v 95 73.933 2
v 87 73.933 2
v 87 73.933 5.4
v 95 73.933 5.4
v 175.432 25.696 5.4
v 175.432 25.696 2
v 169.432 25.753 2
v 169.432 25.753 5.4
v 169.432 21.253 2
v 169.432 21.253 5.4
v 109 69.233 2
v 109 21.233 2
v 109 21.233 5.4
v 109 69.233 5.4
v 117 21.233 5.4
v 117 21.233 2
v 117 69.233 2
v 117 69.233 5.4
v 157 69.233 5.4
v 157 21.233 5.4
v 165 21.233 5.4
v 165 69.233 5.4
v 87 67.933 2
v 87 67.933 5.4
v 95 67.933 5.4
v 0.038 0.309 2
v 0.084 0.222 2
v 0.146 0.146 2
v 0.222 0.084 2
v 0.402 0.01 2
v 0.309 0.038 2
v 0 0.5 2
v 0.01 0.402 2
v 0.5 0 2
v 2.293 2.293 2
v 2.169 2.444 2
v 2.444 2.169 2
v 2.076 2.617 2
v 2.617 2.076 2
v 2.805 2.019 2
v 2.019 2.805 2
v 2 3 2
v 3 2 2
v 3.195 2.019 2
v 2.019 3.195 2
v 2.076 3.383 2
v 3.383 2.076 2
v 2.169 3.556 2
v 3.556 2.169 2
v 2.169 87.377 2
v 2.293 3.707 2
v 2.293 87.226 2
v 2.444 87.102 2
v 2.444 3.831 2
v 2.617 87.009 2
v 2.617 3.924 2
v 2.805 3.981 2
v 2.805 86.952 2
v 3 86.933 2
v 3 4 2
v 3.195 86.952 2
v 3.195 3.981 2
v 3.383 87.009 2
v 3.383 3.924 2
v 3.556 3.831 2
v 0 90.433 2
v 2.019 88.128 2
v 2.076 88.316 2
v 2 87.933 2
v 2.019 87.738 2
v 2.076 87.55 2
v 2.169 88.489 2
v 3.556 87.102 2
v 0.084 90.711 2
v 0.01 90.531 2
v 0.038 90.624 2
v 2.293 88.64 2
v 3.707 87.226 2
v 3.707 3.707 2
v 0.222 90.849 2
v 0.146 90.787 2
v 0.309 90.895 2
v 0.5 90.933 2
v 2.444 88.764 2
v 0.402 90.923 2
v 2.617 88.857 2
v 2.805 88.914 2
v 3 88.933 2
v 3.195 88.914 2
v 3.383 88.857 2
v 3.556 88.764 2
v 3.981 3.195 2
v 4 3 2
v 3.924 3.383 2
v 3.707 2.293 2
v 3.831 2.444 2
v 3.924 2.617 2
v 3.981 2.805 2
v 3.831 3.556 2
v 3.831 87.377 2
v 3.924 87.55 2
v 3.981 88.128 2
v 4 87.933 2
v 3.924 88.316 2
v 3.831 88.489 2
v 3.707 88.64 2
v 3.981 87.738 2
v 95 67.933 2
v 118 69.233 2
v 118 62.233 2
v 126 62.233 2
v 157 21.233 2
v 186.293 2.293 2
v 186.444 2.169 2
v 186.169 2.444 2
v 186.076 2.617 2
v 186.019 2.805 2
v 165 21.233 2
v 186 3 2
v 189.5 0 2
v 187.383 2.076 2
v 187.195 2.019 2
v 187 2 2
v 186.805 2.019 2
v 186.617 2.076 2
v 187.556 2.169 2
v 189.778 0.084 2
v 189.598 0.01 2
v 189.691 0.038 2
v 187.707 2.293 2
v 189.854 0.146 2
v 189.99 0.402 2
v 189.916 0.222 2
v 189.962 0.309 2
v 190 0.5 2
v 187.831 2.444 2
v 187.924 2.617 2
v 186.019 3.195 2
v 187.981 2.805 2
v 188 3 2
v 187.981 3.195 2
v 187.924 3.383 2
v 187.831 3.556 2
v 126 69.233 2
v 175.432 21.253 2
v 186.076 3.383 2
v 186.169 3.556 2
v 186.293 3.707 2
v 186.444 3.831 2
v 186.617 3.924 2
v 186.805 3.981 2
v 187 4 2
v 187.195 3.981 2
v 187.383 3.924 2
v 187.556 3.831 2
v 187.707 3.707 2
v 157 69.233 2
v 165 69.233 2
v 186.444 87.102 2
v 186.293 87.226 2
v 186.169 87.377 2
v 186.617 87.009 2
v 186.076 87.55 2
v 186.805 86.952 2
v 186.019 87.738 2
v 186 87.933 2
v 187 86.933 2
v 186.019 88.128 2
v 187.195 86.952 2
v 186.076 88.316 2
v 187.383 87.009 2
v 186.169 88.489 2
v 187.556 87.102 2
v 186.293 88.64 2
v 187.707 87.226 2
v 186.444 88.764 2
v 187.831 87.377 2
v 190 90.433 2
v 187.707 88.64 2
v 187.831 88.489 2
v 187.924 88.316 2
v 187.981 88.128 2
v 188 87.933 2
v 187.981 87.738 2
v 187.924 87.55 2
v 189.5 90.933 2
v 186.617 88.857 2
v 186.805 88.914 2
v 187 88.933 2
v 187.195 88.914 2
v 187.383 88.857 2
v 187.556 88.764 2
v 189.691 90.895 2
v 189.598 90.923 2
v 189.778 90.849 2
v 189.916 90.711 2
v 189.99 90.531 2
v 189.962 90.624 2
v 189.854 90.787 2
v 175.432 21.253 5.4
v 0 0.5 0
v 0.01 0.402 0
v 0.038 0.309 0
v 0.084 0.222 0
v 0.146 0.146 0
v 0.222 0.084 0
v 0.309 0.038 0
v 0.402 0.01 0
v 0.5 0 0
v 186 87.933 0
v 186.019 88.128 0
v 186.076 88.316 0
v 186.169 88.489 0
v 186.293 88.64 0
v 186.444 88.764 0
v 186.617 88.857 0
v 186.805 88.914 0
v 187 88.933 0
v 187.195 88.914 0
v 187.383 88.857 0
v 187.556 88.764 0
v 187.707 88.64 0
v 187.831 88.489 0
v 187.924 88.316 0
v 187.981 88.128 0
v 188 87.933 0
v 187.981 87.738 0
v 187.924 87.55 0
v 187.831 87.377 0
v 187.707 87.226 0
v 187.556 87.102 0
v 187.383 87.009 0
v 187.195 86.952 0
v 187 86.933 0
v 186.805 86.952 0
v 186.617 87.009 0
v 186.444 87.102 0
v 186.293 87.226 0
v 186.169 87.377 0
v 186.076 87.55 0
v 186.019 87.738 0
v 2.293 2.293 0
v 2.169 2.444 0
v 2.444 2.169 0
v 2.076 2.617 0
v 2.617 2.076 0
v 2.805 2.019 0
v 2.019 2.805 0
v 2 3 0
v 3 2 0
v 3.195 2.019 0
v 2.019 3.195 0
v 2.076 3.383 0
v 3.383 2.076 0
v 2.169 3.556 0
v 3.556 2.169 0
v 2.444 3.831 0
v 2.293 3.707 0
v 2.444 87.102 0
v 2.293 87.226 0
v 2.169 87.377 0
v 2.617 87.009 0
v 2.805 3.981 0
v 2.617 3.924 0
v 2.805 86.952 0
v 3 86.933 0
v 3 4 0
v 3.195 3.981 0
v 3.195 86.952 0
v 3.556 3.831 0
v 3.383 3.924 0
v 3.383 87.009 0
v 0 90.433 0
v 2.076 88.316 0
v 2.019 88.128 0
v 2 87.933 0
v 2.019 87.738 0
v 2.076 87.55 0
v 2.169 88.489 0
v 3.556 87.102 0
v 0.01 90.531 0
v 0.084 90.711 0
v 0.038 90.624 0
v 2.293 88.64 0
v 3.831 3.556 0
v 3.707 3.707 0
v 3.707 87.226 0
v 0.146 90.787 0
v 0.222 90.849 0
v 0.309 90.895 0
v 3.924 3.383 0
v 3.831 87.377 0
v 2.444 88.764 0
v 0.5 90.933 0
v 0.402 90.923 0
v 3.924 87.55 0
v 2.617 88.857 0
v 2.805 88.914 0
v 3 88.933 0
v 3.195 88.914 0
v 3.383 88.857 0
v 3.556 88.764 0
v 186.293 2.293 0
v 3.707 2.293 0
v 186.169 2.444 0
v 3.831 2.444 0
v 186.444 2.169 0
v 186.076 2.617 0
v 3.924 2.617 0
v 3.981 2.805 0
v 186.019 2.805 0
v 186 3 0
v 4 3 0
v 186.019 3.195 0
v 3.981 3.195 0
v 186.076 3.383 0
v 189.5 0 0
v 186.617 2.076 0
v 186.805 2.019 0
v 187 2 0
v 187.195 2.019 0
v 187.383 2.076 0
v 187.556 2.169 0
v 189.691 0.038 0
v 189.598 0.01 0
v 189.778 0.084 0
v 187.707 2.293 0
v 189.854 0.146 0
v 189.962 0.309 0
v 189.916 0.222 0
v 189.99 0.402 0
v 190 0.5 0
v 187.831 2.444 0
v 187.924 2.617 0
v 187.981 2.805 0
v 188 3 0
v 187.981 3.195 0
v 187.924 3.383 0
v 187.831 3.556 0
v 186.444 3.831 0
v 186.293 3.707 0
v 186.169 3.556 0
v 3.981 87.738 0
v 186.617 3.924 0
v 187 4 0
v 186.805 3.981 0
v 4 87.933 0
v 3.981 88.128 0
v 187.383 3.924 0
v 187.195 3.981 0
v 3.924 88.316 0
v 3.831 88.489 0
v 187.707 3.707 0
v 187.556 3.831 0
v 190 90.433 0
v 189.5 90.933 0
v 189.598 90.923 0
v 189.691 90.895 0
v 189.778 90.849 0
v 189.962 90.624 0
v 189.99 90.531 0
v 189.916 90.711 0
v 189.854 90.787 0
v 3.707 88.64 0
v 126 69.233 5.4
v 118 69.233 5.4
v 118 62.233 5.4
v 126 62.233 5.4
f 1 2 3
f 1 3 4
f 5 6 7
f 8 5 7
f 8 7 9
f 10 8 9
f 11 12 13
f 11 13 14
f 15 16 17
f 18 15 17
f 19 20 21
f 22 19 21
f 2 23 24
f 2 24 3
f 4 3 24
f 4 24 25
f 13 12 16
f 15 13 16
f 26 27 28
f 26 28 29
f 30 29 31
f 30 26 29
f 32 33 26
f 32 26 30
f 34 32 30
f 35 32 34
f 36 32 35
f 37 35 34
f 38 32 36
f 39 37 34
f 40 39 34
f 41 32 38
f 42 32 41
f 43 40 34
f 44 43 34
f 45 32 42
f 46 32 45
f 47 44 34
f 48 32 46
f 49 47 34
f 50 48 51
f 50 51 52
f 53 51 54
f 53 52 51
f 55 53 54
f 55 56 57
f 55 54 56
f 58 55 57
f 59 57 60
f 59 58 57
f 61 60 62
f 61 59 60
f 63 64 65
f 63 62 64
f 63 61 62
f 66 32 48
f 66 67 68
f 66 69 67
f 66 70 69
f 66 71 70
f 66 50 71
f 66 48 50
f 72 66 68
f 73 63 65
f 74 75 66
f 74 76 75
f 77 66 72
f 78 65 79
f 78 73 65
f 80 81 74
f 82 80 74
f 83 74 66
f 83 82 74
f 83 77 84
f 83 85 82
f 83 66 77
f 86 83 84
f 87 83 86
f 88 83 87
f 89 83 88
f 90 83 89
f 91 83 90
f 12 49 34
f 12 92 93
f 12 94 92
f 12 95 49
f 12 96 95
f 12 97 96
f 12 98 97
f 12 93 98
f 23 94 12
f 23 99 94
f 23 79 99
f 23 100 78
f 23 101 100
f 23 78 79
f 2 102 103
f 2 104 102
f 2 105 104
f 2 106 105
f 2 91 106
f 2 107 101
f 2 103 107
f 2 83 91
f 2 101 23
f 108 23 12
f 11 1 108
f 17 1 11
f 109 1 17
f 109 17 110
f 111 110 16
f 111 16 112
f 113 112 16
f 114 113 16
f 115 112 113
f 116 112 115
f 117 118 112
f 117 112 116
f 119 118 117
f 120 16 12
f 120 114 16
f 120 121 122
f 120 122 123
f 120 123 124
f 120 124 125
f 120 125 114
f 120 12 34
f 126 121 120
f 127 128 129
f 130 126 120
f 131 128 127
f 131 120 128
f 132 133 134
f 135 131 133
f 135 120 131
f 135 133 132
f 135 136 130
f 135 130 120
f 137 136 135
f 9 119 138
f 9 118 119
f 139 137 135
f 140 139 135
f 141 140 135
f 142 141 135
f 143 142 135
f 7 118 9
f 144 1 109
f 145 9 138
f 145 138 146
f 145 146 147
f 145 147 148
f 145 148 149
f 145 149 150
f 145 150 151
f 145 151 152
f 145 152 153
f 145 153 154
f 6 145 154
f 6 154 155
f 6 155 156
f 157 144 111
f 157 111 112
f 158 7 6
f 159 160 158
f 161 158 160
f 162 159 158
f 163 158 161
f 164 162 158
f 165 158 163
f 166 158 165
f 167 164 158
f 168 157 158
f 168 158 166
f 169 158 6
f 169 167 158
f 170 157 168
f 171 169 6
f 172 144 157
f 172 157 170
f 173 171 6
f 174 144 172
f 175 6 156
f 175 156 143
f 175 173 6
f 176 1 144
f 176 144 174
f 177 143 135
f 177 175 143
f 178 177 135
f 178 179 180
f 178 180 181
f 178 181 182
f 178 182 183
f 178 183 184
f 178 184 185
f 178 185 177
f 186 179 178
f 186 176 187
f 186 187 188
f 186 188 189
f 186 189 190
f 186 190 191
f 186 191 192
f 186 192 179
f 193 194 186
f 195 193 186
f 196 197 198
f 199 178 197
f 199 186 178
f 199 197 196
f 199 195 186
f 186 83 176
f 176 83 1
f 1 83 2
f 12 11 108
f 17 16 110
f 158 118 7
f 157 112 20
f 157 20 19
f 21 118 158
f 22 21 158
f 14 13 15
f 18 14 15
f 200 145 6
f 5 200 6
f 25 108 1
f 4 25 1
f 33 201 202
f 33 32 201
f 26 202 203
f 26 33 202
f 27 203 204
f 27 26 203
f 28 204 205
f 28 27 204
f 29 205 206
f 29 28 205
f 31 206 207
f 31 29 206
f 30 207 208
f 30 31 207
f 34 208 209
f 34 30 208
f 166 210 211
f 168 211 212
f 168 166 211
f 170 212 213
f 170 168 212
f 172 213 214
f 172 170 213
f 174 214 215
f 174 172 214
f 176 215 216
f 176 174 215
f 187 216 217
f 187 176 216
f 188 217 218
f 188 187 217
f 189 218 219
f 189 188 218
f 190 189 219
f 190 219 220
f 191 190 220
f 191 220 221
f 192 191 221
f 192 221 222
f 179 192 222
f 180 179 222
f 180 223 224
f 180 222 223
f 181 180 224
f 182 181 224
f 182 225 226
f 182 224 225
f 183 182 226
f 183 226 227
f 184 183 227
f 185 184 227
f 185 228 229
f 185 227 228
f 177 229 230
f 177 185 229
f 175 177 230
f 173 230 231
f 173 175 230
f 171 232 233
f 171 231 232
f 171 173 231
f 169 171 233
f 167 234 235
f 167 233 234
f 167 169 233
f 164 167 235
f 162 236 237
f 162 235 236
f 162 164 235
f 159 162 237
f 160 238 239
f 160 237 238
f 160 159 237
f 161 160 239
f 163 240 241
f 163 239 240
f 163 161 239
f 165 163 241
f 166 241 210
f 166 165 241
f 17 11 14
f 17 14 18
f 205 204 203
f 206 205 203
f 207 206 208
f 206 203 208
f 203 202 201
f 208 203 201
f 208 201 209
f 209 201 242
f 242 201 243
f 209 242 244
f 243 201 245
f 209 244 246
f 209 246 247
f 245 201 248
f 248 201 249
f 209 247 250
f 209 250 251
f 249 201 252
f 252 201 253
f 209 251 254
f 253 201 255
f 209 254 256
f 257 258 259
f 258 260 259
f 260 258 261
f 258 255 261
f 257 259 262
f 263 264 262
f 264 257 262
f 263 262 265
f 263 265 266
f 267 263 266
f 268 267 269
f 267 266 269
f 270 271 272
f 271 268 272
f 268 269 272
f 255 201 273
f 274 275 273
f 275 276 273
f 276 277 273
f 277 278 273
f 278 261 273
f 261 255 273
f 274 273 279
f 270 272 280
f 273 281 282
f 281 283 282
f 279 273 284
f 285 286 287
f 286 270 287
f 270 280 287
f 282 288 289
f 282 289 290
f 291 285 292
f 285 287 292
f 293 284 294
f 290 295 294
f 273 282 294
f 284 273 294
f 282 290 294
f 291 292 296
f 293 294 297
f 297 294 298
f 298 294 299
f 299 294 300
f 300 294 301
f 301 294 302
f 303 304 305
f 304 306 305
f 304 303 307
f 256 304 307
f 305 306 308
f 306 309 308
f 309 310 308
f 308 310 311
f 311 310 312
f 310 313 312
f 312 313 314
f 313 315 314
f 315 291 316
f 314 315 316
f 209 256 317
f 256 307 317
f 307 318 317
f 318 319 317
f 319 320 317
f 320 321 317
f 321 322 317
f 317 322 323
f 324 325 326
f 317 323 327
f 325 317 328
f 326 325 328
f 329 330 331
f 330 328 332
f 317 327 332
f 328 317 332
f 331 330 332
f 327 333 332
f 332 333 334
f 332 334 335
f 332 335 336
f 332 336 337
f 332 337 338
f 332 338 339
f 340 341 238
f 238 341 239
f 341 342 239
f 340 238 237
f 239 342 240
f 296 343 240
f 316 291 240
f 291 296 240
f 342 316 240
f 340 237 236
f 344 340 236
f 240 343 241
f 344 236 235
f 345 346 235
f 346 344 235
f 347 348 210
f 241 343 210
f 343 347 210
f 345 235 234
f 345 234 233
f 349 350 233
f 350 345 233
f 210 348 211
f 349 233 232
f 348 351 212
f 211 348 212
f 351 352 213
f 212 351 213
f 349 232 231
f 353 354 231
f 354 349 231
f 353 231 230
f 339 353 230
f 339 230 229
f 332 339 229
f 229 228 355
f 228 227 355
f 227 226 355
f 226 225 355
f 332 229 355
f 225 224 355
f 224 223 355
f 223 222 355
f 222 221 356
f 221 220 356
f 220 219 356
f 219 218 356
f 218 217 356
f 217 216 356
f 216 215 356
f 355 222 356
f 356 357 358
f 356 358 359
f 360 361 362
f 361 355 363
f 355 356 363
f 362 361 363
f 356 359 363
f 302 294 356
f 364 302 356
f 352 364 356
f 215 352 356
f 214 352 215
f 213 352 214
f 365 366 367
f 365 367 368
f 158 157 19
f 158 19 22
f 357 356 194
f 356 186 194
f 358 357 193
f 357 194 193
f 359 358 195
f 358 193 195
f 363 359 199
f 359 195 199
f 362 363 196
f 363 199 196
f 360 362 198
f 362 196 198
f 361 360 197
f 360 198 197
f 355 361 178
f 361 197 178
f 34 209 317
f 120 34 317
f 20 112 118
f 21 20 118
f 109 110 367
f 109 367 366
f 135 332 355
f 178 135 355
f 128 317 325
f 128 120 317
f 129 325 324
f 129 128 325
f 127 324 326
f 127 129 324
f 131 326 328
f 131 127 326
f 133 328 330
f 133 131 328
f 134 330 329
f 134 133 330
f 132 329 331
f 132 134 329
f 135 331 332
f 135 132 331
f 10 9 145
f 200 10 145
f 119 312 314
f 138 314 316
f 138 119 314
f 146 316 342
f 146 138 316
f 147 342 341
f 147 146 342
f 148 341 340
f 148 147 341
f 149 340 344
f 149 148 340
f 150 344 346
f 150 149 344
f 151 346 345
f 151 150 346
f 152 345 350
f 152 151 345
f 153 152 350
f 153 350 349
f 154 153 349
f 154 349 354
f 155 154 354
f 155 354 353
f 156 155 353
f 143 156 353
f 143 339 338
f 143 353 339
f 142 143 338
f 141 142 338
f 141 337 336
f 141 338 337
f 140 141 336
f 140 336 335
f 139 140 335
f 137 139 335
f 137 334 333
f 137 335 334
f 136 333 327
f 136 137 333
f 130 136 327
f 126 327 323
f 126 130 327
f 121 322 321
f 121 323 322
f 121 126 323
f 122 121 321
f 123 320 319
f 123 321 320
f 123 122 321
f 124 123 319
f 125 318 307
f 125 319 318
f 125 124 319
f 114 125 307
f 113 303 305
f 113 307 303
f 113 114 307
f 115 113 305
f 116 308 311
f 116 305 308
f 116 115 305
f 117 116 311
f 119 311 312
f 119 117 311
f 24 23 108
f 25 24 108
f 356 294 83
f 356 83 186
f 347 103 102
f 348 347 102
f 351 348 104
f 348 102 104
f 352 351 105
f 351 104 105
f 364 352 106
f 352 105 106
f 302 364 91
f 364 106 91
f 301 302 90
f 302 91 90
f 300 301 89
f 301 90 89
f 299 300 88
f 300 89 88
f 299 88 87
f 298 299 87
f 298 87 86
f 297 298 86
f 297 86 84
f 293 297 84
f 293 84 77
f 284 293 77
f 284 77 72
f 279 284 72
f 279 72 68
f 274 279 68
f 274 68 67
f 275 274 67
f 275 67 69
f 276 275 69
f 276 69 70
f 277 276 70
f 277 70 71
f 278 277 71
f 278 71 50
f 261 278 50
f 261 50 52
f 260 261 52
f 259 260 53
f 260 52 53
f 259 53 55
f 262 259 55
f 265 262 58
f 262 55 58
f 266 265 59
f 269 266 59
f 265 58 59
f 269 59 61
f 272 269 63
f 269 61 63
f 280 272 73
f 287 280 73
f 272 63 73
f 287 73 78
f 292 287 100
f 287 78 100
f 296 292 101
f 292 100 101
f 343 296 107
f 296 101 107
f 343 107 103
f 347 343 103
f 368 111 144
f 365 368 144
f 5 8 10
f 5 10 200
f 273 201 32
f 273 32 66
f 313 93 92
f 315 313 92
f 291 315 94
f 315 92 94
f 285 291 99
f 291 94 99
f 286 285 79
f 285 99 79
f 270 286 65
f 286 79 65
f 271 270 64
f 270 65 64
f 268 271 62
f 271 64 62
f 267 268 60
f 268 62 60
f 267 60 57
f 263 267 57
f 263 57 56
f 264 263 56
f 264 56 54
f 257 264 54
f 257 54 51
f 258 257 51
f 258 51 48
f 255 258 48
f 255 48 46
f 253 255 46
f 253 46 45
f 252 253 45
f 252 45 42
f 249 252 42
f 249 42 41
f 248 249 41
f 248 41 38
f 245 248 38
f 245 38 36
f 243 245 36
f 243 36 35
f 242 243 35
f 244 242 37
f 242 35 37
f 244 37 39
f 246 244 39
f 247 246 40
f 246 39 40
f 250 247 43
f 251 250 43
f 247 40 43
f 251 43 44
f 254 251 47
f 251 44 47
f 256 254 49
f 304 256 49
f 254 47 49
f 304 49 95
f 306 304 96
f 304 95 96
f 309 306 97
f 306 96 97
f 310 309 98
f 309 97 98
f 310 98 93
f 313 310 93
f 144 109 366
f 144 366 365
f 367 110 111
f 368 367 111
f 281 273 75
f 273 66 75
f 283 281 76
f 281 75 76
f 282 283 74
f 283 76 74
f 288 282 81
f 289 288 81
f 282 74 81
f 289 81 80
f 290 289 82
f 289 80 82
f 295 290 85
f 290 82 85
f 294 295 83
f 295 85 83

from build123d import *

# Parameters (mm, degrees)
F0_W      = 190
F0_H      = 90.933
F1_DEPTH  = 2
F2_R      = 1
F3_DEPTH  = 2.001
F6_R      = 0.5
F7_W      = 8
F7_H      = 48
F7_H_2    = 7
F8_DEPTH  = 3.4
F9_W      = 8
F9_H      = 6
F10_DEPTH = 3.4


# Not quite as in the source:
# - a feature names something its author has since deleted; it is built from what else it names


with BuildPart() as f1:
    # F0 (on Top) → F1 (new body)
    with BuildSketch(Plane.XY):
        with Locations((95, 45.4665)):
            Rectangle(F0_W, F0_H)
    extrude(amount=F1_DEPTH)

    # F2 (on face) → F3 (cut, through all)
    with BuildSketch(Plane.XY.offset(2)):
        with Locations((3, 87.933)):
            Circle(F2_R)
        with Locations((3, 3)):
            Circle(F2_R)
    f3 = extrude(amount=-F3_DEPTH, mode=Mode.SUBTRACT)

    # F5: F3 across plane
    add(f3.mirror(Plane(origin=(95, 45.4665, 1), x_dir=(0, -1, 0), z_dir=(-1, 0, 0))), mode=Mode.SUBTRACT)

    # F6
    f6_edges = [f1.edges().sort_by_distance(p)[0] for p in [
        (190, 0, 1),
        (190, 90.933, 1),
        (0, 90.933, 1),
        (0, 0, 1),
    ]]
    fillet(f6_edges, radius=F6_R)

    # F7 (on face) → F8 (join)
    with BuildSketch(Plane.XY.offset(2)):
        with Locations((113, 45.233)):
            Rectangle(F7_W, F7_H)
        with Locations((161, 45.233)):
            Rectangle(F7_W, F7_H)
        with Locations((122, 65.733)):
            Rectangle(F7_W, F7_H_2)
        Polygon((169.4320317507, 25.7526094498), (169.4320317507, 21.2526094498), (175.4320317507, 21.2526094498), (175.4320317507, 25.6957146213), align=None)
    extrude(amount=F8_DEPTH)

    # F9 (on face) → F10 (join)
    with BuildSketch(Plane.XY.offset(2)):
        with Locations((91, 70.933)):
            Rectangle(F9_W, F9_H)
    extrude(amount=F10_DEPTH)


solid = f1.part
